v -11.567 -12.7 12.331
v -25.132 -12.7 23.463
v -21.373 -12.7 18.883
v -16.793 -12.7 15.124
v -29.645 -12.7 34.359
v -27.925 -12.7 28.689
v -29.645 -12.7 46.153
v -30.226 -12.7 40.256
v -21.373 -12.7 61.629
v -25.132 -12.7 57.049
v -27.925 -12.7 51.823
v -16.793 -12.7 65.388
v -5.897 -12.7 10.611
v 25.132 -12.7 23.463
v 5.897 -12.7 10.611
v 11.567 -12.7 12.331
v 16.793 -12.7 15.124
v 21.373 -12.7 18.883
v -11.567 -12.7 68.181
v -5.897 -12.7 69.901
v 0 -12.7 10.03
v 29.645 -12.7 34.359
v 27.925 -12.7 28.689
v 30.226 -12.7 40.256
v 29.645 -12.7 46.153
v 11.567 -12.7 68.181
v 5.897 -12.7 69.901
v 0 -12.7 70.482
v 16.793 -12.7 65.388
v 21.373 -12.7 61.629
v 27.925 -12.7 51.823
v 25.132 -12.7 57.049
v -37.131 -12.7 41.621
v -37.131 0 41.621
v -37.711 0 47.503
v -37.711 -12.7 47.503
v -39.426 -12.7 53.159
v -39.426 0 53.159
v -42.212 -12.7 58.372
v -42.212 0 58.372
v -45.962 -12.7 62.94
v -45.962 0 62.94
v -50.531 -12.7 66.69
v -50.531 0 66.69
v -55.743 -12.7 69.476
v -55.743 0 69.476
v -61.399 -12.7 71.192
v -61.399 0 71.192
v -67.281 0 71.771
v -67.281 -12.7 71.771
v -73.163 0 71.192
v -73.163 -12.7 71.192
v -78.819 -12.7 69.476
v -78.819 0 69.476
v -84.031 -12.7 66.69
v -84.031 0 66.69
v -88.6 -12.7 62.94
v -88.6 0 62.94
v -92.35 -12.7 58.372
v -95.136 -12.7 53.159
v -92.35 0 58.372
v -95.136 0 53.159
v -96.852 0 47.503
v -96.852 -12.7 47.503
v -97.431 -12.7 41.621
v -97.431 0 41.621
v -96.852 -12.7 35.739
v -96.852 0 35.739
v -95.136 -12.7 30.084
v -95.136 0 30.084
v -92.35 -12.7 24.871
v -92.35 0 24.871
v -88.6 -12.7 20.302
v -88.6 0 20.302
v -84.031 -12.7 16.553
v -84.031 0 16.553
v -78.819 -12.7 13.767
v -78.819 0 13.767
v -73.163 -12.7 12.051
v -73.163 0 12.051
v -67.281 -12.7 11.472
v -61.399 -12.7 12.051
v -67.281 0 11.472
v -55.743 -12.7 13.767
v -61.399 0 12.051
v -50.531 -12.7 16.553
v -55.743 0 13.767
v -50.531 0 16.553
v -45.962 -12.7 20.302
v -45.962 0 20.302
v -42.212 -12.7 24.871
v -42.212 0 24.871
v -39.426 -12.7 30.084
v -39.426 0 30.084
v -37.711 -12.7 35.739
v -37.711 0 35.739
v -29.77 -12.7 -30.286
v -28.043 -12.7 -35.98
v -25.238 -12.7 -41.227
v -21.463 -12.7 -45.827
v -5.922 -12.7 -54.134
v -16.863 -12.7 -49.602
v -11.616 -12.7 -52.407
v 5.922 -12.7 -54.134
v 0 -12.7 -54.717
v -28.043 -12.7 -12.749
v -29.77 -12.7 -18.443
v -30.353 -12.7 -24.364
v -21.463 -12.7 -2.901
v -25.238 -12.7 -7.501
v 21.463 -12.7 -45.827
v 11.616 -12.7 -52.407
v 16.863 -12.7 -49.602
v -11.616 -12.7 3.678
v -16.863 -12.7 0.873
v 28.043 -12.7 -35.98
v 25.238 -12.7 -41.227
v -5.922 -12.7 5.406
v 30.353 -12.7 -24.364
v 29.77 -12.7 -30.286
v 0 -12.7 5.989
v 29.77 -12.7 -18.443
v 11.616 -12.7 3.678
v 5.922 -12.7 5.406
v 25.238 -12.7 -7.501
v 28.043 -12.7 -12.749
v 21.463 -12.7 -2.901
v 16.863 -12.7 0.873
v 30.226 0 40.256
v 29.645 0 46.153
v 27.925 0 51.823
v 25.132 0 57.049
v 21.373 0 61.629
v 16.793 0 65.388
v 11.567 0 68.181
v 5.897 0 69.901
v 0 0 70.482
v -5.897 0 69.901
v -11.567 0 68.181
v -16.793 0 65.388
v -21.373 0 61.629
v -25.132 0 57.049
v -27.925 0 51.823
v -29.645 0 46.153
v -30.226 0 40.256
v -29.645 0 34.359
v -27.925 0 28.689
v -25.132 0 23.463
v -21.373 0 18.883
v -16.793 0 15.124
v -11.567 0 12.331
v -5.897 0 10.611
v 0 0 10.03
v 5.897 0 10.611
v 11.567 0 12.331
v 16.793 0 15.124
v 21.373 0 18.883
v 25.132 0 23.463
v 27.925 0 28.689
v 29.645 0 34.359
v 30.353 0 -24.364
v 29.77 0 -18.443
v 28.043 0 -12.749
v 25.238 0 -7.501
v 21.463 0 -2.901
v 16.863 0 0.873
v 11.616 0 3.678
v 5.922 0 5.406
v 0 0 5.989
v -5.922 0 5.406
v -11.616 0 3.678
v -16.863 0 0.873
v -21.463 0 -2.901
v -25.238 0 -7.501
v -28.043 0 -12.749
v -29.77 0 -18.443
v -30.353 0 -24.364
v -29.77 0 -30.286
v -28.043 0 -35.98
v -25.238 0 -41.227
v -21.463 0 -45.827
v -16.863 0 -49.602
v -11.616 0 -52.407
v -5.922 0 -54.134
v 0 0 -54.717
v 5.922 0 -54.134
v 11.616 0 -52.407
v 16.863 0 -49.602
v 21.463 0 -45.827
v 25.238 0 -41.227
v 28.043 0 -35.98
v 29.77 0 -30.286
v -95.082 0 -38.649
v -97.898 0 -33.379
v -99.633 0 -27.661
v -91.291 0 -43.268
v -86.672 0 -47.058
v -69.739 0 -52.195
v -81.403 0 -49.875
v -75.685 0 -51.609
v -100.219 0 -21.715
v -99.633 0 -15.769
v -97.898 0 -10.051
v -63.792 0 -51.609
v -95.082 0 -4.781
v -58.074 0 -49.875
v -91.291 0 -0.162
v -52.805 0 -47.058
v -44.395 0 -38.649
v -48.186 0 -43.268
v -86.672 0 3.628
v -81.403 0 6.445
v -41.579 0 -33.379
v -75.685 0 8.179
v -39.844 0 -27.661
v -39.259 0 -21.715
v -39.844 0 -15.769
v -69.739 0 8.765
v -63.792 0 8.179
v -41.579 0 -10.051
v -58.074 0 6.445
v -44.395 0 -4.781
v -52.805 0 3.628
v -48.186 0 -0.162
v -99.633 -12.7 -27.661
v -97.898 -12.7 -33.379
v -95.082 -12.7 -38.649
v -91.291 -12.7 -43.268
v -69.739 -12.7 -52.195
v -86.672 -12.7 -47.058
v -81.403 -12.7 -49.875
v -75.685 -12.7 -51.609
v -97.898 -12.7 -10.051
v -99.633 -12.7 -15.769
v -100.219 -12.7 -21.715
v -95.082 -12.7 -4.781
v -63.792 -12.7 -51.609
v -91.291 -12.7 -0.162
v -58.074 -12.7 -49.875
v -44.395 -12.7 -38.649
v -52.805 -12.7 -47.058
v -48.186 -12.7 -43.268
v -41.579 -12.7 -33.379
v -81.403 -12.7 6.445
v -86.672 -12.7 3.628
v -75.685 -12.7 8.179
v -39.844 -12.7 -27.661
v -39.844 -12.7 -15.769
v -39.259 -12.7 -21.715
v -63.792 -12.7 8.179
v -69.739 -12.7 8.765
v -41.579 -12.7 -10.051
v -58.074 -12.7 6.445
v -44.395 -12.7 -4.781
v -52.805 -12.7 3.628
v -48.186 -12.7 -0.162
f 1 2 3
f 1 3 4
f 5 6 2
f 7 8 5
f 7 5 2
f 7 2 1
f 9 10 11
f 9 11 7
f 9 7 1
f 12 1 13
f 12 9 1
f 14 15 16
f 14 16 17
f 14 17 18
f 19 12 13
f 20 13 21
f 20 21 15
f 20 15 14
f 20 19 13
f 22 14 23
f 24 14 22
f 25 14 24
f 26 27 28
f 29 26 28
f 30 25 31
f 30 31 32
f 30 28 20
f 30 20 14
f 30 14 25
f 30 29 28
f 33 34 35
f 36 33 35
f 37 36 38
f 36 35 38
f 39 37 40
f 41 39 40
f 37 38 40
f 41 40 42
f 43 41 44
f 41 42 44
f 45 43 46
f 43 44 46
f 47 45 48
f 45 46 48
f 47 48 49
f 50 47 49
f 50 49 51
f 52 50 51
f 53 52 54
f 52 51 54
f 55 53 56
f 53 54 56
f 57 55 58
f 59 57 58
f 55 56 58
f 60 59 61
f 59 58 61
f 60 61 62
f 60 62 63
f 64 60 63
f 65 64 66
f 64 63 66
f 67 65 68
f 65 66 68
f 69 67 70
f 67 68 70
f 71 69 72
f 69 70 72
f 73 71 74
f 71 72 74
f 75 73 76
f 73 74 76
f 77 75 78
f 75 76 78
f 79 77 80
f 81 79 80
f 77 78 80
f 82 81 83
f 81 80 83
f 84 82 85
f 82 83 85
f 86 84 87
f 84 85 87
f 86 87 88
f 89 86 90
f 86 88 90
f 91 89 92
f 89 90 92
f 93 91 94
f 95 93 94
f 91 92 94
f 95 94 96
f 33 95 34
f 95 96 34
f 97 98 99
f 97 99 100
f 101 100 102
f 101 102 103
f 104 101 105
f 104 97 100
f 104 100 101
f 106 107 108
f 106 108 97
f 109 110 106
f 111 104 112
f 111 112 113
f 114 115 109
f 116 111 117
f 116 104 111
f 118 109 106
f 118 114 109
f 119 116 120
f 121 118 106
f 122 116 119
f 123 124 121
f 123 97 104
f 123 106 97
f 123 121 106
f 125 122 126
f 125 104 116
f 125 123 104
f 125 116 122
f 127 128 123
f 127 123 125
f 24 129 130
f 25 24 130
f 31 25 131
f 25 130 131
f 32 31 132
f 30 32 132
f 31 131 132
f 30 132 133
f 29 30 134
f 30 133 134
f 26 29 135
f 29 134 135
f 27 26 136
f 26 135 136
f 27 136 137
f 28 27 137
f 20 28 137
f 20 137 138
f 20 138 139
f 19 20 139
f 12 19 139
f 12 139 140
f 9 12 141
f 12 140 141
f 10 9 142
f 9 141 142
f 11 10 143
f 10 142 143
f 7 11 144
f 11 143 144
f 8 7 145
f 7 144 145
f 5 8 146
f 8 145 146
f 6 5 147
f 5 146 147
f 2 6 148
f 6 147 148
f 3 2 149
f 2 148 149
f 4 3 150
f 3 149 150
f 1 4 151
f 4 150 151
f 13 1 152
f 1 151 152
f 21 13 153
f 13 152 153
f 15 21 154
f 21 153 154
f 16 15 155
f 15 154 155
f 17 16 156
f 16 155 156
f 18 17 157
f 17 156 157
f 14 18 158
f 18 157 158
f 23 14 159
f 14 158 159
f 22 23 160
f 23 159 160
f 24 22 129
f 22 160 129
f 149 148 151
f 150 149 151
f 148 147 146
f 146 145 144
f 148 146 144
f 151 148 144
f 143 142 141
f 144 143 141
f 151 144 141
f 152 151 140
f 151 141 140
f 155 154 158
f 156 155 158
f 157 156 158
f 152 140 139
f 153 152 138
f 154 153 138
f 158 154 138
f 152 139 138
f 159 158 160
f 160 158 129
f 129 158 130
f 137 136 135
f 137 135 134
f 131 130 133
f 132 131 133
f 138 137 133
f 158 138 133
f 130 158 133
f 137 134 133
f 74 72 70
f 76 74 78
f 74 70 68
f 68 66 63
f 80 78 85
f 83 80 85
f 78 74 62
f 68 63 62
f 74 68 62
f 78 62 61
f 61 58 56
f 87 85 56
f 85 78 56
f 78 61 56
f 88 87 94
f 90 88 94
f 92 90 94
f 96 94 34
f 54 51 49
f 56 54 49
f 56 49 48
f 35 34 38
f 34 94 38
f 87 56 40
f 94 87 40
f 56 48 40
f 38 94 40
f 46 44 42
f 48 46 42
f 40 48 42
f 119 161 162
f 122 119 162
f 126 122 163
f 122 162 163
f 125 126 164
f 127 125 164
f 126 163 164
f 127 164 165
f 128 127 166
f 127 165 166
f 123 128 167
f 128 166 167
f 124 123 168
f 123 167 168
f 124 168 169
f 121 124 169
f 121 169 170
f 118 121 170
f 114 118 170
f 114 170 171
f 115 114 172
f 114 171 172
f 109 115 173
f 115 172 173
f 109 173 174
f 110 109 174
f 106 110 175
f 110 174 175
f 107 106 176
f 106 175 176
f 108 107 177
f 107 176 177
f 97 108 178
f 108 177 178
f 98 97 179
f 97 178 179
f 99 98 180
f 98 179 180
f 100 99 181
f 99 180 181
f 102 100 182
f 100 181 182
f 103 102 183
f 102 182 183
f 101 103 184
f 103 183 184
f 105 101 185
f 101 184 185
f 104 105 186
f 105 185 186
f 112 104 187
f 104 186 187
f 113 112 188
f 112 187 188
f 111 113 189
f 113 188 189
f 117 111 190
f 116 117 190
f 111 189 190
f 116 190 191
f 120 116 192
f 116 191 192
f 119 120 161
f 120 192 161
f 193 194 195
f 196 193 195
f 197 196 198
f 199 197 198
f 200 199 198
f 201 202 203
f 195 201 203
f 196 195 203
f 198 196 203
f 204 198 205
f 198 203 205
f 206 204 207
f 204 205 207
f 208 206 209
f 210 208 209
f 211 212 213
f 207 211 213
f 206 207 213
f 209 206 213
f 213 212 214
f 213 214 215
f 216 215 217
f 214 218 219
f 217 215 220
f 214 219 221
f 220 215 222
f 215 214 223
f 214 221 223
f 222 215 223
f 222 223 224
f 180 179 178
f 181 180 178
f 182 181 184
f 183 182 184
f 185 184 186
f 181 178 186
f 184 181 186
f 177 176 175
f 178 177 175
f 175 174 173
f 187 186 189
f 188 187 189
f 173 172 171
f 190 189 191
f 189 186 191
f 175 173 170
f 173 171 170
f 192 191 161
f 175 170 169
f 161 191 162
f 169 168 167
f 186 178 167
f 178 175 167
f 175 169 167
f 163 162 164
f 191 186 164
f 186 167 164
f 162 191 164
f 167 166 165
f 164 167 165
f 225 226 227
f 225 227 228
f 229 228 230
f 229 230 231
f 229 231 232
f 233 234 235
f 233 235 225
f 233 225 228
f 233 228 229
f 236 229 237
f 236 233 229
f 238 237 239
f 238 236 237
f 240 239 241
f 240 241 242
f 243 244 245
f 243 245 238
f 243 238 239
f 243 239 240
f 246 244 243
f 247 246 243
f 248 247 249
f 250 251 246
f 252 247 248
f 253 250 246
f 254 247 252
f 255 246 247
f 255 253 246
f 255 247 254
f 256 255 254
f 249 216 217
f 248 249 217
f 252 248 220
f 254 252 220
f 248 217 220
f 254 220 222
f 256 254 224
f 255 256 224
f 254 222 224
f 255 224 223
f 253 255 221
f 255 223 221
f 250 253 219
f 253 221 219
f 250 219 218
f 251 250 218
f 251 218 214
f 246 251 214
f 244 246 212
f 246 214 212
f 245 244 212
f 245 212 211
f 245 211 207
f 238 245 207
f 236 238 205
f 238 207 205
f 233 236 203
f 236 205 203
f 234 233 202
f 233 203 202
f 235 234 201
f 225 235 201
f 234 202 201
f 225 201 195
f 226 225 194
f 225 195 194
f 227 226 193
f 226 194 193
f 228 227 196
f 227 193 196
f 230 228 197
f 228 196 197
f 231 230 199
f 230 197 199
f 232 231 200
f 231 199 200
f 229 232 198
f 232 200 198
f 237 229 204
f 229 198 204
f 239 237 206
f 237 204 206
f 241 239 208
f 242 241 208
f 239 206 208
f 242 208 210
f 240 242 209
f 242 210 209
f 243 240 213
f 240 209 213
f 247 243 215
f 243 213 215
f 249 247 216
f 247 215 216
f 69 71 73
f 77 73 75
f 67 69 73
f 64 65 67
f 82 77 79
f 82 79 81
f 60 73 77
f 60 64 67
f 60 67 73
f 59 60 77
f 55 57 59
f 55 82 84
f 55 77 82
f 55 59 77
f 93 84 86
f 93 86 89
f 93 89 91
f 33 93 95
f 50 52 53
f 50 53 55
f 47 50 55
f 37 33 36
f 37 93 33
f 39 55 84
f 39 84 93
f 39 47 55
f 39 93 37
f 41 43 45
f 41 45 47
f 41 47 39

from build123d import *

# Parameters (mm, degrees)
F0_R     = 30.1498
F0_R_2   = 30.48
F0_R_3   = 30.226
F0_R_4   = 30.353
F1_DEPTH = 12.7


with BuildPart() as f1:
    # F0 (on Front) → F1 (new body)
    with BuildSketch(Plane.XZ):
        with Locations((-67.281134, 41.621365)):
            Circle(F0_R)
        with Locations((-69.738518, -21.714962)):
            Circle(F0_R_2)
        with Locations((0, 40.256064)):
            Circle(F0_R_3)
        with Locations((0, -24.364225)):
            Circle(F0_R_4)
    extrude(amount=F1_DEPTH)


solid = f1.part
